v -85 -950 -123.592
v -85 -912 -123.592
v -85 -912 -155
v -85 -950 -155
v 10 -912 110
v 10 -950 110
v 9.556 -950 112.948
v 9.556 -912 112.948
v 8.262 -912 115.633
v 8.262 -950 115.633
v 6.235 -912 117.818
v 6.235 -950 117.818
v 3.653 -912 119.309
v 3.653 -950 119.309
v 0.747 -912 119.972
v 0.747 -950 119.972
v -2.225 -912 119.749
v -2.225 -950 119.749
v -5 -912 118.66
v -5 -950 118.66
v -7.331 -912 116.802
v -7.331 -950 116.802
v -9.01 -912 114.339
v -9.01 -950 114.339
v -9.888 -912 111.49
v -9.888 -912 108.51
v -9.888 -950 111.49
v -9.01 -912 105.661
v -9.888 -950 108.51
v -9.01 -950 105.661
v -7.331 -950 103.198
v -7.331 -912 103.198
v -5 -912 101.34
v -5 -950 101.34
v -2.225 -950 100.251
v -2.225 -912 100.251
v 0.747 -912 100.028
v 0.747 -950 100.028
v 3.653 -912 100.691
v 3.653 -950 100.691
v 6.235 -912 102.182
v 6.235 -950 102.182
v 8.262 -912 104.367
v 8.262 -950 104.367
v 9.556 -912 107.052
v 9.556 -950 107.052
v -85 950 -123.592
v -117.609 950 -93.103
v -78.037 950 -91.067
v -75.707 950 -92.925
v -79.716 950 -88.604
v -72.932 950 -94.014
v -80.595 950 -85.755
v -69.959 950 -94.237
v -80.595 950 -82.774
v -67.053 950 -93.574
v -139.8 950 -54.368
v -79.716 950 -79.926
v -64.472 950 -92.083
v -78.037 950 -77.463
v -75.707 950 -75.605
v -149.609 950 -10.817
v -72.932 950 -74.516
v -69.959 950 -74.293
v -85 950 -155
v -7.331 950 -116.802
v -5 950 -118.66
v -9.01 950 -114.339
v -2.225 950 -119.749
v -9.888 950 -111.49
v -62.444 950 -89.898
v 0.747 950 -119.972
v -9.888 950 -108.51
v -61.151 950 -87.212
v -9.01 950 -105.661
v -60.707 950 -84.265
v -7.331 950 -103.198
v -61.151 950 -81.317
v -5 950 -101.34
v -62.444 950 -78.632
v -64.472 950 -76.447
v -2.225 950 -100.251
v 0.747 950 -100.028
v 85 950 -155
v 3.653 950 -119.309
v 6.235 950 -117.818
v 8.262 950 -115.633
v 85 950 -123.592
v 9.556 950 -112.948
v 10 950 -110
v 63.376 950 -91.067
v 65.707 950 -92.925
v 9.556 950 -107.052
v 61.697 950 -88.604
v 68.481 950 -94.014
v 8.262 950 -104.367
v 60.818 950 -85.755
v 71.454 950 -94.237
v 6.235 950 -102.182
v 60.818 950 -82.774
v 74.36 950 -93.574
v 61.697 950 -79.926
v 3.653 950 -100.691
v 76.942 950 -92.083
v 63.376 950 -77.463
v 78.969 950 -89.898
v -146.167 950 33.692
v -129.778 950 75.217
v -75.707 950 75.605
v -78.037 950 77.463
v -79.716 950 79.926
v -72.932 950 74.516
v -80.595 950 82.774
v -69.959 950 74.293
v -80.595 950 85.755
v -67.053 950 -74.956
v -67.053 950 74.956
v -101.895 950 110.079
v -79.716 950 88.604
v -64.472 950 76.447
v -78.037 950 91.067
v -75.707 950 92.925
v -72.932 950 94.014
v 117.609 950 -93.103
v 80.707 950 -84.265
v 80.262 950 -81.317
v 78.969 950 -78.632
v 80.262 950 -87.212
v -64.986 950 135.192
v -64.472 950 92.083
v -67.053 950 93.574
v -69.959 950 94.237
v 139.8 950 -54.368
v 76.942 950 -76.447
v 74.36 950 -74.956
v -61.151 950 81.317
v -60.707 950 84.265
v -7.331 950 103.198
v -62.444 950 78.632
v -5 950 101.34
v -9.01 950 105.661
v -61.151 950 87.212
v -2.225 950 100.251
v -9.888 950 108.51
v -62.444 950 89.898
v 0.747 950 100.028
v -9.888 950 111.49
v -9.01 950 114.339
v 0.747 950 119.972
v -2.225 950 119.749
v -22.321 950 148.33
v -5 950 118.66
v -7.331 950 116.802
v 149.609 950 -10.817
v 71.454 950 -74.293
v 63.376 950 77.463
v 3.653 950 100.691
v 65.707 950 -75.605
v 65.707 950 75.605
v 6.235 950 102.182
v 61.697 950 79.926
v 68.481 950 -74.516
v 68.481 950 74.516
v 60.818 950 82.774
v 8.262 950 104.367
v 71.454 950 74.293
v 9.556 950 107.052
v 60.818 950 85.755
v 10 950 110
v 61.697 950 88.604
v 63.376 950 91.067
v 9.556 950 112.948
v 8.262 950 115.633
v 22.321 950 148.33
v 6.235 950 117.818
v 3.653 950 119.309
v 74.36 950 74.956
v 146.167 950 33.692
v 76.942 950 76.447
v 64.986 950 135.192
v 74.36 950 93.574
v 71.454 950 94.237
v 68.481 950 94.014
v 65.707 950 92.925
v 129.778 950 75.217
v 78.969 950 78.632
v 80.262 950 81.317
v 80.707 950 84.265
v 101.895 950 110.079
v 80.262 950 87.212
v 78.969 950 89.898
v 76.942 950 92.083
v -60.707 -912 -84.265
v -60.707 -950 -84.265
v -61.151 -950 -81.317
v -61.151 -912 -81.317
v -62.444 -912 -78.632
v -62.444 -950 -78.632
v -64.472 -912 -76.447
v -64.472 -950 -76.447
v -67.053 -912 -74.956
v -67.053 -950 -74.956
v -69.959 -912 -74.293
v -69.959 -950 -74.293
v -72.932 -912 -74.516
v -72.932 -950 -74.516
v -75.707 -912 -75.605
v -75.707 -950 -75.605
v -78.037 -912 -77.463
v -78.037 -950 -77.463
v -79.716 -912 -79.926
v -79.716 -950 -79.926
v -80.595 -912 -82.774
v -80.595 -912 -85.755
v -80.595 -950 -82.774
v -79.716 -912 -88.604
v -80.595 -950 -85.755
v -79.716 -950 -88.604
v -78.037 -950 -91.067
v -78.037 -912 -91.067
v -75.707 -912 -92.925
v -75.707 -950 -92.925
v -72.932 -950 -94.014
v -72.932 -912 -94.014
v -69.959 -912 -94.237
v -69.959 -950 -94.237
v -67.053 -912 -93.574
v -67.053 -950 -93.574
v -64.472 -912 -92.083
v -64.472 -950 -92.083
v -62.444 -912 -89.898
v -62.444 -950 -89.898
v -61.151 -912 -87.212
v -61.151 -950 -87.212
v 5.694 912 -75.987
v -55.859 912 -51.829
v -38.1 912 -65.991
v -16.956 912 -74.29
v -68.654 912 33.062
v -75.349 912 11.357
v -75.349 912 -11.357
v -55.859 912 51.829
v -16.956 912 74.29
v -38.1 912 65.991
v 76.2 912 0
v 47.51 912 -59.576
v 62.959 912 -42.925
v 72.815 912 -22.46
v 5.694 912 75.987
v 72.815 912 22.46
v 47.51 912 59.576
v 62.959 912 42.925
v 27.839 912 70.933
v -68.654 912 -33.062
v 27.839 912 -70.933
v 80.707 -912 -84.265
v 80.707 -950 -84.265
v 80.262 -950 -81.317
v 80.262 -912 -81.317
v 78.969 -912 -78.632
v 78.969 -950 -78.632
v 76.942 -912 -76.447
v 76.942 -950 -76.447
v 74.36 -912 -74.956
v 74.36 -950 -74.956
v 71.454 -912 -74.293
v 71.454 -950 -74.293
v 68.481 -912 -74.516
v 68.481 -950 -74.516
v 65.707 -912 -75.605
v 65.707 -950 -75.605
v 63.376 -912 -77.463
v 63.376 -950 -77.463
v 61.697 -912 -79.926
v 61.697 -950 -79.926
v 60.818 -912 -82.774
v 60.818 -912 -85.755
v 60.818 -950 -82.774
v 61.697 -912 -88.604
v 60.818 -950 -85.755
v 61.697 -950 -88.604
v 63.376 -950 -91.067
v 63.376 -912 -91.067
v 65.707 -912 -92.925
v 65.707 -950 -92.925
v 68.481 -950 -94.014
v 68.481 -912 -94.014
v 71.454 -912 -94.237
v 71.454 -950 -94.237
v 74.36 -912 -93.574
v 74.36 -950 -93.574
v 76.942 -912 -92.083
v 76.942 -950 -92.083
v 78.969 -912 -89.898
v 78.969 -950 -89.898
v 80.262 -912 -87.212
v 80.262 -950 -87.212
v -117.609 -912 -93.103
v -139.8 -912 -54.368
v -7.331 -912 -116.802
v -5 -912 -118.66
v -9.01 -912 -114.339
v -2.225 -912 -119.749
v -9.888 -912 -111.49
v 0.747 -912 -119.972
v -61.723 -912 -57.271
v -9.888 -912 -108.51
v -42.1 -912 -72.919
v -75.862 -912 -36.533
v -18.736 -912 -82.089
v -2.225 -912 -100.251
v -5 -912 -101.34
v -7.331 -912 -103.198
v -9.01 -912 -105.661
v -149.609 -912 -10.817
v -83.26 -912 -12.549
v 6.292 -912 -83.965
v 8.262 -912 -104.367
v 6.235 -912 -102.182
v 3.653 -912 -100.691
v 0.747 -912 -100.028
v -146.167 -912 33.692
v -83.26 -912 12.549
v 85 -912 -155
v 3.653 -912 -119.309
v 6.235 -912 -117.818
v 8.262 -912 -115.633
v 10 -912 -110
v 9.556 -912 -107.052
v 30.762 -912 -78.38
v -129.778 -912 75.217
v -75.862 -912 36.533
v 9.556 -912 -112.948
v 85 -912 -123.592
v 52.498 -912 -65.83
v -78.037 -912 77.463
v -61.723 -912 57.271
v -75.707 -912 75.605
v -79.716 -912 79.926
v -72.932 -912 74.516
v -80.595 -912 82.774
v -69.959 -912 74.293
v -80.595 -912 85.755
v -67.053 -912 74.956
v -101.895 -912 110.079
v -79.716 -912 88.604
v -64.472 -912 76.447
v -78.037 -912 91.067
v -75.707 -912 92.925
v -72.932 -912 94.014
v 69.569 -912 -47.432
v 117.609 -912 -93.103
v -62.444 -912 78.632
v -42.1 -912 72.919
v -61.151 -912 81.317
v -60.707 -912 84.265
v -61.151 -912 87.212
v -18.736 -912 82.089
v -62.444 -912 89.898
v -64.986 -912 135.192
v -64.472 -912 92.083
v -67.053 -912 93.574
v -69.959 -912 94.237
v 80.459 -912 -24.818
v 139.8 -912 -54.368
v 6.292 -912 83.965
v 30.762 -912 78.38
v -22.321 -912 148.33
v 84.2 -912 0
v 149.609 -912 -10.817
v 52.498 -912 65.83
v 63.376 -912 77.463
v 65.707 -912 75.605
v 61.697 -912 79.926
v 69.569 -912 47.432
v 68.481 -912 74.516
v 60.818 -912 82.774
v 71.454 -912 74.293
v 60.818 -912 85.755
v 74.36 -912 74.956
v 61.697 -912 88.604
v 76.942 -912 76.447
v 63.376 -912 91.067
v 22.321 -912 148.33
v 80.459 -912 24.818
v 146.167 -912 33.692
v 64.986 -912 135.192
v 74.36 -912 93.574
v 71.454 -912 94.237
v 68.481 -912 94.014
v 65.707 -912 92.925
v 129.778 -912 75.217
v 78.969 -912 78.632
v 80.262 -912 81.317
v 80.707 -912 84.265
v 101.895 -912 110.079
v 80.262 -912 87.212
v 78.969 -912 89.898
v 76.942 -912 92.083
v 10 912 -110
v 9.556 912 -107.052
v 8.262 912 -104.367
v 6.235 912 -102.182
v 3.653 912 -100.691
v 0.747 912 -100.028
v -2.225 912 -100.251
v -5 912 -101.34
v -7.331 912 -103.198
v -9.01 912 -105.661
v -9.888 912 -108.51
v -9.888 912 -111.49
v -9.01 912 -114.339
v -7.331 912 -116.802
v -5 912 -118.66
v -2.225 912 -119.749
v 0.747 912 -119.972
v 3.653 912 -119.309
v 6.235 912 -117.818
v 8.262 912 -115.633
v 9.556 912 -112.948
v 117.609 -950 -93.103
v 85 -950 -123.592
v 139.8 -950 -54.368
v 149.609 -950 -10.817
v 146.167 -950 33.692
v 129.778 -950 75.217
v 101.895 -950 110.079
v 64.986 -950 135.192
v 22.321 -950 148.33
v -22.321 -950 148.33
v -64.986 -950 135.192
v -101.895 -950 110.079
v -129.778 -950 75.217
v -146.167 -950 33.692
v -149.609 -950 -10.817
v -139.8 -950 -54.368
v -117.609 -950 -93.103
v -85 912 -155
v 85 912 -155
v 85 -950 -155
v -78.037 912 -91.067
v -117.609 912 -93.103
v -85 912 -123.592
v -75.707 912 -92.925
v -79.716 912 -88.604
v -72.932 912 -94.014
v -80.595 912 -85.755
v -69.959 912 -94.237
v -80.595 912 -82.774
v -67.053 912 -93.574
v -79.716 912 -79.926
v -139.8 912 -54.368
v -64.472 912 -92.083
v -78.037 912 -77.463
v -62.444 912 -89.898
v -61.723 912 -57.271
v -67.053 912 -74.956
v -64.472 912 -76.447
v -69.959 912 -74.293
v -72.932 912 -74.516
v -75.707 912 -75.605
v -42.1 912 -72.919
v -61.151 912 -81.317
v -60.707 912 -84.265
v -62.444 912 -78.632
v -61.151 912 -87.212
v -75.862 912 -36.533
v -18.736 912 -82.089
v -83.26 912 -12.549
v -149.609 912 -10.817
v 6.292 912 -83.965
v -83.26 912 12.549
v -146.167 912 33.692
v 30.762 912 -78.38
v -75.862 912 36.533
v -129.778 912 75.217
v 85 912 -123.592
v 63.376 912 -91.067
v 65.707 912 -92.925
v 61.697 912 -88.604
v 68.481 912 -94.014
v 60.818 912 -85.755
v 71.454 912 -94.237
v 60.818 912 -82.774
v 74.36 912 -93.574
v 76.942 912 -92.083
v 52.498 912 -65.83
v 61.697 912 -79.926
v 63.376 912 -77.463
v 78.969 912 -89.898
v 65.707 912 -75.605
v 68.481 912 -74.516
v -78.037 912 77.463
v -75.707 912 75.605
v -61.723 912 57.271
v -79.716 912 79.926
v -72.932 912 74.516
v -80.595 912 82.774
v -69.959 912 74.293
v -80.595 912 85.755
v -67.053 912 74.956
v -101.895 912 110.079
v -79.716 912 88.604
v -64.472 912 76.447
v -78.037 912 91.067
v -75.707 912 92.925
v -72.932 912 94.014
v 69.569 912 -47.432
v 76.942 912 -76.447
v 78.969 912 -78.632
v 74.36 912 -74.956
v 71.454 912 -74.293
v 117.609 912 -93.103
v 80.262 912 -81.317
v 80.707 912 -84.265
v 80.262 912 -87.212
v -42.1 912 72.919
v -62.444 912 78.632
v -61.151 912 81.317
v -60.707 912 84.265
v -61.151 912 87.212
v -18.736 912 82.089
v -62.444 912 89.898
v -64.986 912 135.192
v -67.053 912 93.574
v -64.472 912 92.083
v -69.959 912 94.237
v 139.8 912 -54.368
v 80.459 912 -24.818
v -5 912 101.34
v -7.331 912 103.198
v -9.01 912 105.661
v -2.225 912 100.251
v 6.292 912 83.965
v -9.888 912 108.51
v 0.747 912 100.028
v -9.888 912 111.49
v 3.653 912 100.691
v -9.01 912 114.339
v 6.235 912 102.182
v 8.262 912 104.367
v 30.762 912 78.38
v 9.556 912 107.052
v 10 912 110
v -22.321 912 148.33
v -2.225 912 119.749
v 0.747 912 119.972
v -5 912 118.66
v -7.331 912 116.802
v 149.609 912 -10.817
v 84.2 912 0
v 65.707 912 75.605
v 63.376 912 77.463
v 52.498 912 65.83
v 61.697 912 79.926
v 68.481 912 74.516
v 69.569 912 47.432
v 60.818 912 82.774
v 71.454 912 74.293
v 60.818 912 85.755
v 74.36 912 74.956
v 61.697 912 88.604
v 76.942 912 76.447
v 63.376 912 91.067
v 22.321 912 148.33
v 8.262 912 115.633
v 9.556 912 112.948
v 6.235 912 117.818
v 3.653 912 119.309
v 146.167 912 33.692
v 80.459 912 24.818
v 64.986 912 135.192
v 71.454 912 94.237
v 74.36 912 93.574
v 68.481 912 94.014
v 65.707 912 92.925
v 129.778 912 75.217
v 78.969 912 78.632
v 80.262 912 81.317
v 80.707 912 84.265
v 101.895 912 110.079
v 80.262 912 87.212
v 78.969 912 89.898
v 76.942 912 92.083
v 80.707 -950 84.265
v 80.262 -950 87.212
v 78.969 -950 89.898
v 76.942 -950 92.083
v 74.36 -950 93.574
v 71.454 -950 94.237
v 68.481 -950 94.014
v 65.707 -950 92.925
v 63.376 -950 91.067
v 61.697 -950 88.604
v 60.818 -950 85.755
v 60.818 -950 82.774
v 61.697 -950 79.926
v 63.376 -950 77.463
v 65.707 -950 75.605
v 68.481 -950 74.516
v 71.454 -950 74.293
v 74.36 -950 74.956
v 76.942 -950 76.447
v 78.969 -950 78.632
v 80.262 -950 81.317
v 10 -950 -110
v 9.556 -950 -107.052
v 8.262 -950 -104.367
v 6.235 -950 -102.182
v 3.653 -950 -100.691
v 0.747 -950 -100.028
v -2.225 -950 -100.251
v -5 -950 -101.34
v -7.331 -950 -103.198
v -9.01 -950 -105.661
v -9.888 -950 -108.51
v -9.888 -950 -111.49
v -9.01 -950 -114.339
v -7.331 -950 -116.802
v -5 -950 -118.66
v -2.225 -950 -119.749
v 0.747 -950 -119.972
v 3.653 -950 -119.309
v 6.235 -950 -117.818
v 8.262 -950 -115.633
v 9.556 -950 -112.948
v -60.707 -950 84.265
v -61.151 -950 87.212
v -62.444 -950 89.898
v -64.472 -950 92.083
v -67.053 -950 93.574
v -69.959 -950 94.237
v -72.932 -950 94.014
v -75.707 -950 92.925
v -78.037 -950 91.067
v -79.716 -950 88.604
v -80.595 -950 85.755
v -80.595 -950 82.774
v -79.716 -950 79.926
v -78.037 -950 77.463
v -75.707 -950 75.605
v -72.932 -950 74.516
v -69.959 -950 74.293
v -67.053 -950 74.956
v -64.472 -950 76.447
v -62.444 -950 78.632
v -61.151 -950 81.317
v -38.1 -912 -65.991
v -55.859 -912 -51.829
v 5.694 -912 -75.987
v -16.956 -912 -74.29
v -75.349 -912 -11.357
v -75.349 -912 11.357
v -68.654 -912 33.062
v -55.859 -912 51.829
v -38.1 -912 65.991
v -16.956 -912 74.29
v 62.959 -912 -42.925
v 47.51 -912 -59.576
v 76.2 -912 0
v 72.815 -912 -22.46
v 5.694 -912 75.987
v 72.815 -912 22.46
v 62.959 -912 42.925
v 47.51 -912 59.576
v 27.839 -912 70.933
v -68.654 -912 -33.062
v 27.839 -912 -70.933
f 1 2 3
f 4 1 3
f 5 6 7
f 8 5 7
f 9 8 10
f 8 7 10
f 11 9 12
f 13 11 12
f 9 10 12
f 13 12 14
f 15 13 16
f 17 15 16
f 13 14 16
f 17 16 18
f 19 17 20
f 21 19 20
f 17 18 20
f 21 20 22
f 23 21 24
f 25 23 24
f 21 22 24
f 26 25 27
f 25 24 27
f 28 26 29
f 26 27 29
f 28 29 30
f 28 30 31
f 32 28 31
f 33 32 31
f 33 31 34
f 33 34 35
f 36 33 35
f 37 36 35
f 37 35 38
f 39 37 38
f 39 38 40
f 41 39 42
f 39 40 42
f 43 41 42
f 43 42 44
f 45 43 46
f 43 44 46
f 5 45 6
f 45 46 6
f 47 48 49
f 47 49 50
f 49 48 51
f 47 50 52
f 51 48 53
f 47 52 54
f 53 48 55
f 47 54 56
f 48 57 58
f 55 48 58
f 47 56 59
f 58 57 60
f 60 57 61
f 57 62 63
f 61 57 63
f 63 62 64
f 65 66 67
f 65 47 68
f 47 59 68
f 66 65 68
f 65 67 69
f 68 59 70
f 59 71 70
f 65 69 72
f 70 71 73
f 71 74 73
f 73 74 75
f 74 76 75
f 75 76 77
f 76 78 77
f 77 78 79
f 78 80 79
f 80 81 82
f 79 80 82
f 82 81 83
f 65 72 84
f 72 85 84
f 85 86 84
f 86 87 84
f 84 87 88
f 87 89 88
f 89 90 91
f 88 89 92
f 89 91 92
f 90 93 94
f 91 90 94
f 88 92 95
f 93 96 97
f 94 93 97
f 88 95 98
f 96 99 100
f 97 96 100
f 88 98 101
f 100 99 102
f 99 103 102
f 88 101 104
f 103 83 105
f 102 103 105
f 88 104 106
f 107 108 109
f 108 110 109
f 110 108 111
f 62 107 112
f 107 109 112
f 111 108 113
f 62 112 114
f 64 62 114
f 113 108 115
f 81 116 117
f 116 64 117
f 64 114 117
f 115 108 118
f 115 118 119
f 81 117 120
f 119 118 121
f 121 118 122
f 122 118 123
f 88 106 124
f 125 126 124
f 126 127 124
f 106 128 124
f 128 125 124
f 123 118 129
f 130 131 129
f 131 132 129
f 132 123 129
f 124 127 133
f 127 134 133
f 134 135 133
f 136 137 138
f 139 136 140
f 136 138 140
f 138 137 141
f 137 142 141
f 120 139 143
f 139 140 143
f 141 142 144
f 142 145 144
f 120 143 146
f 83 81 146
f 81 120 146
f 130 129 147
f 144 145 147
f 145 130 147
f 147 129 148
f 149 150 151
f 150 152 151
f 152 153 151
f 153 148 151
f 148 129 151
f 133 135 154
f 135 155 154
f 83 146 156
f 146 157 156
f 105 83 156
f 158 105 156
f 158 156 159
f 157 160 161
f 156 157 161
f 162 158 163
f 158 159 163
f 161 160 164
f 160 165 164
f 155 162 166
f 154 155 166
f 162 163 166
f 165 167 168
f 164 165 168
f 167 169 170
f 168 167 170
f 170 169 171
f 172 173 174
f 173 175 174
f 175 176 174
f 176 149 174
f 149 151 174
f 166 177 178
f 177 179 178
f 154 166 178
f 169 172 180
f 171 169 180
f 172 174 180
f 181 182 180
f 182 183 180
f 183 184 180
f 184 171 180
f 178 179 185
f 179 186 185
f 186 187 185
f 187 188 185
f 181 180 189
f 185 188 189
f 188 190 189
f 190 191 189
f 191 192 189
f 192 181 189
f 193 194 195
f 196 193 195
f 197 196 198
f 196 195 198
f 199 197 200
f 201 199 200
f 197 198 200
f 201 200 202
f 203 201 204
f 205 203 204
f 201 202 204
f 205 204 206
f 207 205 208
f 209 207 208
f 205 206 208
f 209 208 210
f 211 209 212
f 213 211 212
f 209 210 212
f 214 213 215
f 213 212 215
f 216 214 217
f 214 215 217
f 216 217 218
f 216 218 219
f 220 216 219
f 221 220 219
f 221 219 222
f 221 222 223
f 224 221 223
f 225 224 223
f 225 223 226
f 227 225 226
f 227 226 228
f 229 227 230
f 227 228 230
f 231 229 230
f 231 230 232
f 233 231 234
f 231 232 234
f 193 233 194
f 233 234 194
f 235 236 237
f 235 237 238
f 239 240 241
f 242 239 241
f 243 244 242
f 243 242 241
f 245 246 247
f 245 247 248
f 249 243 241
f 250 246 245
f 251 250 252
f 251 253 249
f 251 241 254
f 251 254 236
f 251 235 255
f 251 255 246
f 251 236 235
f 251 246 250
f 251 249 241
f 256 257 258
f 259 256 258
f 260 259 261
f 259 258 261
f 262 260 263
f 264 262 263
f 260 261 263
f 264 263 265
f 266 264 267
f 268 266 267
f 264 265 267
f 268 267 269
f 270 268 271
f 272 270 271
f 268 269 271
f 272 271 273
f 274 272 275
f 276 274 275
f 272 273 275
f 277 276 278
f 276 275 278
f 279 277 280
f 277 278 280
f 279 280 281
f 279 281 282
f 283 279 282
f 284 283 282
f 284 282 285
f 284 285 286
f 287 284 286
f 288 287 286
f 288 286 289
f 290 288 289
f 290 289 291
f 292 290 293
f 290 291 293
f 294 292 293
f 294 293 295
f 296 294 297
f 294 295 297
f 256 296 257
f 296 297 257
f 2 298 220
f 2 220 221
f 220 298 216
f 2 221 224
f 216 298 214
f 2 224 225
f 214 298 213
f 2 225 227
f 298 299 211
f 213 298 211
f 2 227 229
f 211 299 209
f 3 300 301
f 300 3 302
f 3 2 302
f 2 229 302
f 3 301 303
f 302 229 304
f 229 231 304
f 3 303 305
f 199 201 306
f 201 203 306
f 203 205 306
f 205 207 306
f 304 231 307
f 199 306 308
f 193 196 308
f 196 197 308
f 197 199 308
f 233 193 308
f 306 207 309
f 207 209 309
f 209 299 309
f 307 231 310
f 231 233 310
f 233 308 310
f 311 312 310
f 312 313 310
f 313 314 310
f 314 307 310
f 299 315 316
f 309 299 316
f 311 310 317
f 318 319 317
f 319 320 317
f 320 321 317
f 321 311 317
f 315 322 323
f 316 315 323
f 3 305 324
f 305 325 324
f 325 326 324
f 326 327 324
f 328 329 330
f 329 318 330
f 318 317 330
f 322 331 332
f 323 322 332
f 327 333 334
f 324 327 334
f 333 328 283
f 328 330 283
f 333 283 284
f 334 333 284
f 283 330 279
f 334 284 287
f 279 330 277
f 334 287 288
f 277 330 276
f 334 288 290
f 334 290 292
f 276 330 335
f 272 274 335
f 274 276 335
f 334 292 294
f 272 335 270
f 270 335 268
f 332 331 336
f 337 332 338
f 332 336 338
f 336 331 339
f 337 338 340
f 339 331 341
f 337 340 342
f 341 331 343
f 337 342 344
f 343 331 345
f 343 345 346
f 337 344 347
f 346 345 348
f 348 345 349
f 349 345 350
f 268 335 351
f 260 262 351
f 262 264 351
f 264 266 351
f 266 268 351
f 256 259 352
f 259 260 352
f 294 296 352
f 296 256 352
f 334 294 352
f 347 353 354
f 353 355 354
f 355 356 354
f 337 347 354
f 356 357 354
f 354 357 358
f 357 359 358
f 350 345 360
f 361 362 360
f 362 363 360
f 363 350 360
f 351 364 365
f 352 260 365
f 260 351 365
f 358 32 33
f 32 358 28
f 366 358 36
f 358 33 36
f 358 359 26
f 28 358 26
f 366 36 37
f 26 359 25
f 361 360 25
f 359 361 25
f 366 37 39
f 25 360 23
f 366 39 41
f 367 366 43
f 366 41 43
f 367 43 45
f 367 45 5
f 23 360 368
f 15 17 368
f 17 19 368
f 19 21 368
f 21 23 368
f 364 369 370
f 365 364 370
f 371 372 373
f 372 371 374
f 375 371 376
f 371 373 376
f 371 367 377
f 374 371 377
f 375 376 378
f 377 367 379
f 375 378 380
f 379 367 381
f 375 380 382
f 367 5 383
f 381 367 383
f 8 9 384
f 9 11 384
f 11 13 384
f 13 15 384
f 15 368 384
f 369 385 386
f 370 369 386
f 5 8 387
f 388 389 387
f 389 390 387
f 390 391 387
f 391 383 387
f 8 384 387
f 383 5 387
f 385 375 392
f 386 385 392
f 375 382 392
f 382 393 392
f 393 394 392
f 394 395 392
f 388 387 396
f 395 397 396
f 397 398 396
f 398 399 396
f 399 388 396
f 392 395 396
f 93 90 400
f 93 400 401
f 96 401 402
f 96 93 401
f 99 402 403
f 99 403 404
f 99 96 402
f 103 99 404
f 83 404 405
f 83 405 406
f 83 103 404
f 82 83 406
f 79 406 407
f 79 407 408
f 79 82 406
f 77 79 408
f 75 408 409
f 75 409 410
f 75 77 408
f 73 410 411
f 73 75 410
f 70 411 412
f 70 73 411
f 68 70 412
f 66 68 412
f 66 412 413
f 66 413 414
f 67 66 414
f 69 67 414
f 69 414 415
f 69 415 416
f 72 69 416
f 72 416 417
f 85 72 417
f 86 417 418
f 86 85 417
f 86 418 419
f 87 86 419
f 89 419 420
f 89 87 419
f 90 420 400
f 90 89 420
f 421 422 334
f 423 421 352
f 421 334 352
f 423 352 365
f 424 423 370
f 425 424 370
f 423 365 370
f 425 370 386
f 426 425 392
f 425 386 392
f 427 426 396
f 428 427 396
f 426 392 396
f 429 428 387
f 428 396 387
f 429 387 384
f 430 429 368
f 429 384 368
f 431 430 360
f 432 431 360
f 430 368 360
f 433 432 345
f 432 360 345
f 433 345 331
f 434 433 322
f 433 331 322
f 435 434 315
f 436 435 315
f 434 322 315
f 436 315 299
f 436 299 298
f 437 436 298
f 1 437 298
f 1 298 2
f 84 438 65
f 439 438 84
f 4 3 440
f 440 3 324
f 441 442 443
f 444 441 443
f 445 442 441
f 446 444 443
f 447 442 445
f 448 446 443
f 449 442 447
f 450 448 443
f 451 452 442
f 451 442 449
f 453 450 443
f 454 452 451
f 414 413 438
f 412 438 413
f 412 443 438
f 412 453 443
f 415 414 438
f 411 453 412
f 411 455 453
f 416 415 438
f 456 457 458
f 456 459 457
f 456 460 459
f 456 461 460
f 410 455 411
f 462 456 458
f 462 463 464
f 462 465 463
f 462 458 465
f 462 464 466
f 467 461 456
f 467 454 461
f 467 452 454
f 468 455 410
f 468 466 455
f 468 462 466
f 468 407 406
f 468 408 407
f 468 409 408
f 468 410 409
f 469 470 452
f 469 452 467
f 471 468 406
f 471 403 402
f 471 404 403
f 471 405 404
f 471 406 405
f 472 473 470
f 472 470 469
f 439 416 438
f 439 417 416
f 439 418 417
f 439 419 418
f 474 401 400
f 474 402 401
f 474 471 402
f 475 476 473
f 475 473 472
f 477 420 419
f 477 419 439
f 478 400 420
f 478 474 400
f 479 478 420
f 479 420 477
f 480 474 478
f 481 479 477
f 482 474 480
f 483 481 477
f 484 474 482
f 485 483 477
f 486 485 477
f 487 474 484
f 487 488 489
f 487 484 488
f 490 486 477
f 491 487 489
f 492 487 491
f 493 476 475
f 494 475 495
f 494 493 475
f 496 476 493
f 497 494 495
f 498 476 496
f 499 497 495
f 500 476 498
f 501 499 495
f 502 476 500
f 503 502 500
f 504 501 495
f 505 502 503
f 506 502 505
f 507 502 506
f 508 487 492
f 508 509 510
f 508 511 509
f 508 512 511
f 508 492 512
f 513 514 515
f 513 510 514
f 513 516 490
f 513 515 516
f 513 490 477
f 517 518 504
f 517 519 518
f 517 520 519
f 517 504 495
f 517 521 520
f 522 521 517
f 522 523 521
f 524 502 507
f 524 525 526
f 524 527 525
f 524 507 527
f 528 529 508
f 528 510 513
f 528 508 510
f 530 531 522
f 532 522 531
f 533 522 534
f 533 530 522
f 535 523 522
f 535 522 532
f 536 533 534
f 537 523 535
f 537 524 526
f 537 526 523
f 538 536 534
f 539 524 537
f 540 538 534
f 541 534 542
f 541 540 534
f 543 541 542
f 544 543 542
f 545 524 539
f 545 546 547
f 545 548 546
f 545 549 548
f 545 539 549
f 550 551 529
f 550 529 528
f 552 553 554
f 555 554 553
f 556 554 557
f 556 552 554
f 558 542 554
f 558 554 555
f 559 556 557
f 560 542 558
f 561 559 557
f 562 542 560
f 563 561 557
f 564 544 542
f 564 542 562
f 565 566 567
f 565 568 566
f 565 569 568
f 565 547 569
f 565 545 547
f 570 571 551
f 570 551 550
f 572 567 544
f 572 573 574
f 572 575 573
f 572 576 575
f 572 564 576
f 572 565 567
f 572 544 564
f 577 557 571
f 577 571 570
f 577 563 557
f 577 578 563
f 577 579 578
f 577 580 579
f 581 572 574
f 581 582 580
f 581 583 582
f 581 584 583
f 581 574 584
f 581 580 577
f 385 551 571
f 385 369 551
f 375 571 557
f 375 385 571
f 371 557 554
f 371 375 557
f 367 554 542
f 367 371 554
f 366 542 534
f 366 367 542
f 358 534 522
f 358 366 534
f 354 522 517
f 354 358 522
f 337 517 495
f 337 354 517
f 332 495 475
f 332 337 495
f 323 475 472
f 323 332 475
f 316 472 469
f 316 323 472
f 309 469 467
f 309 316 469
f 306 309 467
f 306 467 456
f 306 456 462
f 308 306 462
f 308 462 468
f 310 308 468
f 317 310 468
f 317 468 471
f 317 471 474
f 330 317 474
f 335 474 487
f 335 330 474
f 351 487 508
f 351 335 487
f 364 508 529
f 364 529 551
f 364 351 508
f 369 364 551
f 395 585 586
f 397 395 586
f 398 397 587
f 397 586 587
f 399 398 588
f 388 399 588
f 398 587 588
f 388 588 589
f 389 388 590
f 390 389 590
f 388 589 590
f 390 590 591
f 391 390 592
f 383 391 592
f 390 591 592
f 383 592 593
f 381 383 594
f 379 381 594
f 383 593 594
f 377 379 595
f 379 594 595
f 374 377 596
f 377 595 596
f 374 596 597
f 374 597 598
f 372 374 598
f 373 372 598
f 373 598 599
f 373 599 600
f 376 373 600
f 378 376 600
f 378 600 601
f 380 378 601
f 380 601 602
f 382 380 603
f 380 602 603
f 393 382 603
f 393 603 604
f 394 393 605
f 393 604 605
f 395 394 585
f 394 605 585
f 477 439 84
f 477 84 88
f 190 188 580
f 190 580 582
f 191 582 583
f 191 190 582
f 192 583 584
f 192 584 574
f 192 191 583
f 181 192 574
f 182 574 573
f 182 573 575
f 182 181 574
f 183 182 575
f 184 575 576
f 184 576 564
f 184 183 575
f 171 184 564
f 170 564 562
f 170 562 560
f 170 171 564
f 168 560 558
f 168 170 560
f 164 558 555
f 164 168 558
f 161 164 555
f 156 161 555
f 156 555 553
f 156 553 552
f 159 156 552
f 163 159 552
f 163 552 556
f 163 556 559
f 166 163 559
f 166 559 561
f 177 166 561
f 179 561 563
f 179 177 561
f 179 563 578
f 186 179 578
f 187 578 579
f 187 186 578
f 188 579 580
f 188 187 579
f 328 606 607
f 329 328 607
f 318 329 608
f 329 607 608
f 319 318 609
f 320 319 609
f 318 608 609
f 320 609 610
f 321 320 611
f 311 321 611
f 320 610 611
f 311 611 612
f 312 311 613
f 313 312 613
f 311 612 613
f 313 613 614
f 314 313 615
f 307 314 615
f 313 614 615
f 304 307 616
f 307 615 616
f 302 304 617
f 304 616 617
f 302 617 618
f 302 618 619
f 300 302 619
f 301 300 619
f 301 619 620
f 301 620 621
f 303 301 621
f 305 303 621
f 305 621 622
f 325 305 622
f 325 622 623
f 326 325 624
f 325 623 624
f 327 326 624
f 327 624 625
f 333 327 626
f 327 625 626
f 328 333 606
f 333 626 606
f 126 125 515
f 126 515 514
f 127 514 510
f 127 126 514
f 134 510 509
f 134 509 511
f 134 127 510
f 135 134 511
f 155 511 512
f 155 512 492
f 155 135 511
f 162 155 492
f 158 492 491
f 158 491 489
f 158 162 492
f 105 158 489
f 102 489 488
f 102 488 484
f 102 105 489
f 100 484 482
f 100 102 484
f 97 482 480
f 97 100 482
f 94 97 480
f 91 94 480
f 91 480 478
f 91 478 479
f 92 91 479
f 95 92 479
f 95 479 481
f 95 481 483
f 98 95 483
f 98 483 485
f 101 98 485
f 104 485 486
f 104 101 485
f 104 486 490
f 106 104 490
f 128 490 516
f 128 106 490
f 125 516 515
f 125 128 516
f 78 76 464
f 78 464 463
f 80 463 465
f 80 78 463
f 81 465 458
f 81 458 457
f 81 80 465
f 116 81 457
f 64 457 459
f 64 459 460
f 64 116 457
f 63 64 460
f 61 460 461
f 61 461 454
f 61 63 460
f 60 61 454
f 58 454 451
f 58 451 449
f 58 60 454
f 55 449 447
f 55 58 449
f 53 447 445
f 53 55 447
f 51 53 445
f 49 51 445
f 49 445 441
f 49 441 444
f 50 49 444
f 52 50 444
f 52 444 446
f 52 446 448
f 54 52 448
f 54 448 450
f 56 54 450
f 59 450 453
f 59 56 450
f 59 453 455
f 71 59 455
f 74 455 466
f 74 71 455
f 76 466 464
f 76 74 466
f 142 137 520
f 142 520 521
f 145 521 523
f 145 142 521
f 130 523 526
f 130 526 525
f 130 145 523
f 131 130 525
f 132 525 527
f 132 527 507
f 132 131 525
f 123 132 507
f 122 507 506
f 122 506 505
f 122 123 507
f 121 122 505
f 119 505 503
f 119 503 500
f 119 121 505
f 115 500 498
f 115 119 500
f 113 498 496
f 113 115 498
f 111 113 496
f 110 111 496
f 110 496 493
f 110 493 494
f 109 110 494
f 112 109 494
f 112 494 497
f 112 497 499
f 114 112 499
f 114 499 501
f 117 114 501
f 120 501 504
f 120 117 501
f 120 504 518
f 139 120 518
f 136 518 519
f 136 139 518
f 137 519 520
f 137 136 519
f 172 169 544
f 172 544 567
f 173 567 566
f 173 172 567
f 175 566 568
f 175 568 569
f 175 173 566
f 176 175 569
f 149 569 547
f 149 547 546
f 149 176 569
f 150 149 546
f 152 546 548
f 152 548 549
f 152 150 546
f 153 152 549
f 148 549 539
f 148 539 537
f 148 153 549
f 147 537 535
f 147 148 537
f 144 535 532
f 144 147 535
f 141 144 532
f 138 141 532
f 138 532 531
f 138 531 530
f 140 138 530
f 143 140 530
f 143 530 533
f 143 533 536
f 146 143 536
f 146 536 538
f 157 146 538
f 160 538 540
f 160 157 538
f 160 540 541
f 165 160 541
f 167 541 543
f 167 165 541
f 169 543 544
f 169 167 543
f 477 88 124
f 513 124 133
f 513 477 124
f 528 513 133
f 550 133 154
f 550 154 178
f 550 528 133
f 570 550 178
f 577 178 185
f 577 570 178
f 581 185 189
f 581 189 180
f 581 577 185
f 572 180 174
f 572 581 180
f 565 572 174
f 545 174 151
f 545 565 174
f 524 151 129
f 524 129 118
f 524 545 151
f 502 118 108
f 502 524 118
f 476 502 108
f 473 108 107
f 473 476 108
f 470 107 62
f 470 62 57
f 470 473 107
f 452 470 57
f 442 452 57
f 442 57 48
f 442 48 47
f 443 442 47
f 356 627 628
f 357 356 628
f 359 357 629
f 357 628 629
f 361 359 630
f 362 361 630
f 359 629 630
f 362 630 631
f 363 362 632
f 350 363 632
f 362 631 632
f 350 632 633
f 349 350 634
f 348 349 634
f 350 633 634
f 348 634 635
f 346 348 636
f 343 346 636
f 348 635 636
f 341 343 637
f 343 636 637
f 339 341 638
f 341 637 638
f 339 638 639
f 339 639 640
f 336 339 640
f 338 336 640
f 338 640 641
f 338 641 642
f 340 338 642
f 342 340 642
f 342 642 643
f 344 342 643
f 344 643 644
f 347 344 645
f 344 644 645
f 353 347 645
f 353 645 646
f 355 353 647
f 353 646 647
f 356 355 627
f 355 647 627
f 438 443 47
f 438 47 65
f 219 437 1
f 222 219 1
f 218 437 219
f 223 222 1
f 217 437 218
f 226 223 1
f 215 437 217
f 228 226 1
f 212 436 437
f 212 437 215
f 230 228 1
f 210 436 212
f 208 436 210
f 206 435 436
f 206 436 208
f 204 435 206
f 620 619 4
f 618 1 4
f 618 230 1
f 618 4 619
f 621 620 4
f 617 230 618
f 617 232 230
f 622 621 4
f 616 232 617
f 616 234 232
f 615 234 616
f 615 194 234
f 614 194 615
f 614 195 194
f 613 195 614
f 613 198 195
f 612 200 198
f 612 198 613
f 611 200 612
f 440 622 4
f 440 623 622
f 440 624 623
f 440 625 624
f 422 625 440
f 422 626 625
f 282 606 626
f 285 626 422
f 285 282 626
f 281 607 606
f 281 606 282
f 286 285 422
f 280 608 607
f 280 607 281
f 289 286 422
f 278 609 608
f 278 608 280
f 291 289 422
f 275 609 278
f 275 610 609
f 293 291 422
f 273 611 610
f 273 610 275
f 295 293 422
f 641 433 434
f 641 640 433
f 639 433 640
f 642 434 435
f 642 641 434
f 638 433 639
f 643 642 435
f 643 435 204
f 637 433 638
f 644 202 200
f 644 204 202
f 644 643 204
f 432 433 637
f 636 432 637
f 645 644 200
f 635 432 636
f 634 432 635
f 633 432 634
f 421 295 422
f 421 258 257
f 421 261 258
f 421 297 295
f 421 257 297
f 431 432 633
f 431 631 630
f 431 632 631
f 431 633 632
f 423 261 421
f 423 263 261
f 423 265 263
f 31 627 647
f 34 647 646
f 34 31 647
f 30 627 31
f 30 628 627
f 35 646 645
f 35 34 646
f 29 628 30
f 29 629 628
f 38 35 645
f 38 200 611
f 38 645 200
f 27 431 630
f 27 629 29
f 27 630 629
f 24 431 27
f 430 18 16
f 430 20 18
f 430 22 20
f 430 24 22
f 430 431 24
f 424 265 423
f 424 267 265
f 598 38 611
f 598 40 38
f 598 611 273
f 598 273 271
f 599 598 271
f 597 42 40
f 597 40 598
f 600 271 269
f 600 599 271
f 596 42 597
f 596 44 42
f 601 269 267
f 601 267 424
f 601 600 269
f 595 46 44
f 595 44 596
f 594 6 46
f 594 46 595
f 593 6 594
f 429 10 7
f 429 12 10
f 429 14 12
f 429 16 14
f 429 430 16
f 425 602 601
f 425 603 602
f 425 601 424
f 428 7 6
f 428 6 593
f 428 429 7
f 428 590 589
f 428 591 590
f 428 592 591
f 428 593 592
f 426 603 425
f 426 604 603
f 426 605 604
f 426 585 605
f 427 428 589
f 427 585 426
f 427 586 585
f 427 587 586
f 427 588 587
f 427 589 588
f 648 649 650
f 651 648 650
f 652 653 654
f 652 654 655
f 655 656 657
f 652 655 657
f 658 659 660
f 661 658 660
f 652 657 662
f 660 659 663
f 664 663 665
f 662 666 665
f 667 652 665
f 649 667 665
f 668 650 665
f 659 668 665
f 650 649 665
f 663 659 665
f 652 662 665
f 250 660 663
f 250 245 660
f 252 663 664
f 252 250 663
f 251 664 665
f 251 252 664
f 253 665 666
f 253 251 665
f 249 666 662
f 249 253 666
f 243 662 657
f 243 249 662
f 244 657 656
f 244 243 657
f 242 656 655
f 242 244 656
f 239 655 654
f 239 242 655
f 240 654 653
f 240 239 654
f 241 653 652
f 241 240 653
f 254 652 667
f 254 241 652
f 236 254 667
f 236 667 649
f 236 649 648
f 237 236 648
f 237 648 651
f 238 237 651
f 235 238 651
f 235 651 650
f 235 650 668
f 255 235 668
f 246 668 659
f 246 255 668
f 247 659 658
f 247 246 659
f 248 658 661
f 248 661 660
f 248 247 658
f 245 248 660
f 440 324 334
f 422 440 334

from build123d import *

# Parameters (mm, degrees)
F0_R      = 84.2
F0_R_2    = 76.2
F1_DEPTH  = 912
F2_R      = 75
F3_DEPTH  = 10
F4_R      = 10
F5_DEPTH  = 10
F8_DEPTH  = 38
F9_R      = 10
F10_DEPTH = 38


# Not quite as in the source:
# - a pattern or mirror of a feature is missing from the dataset's text; its kind, count and spacing are read off the source's solid
# - a feature names something its author has since deleted; it is built from what else it names


with BuildPart() as f1:
    # F0 (on Front) → F1 (new body, symmetric)
    with BuildSketch(Plane.XZ):
        Circle(F0_R)
        Circle(F0_R_2, mode=Mode.SUBTRACT)
    extrude(amount=F1_DEPTH, both=True)

    # F7 (on face) → F8 (join)
    with BuildSketch(Plane.XZ.offset(912)):
        with BuildLine():
            Line((85, -155), (85, -123.5920709431))
            ThreePointArc((85, -123.5920709431), (0, 150), (-85, -123.5920709431))
            Line((-85, -123.5920709431), (-85, -155))
            Line((-85, -155), (85, -155))
        make_face()
    f8 = extrude(amount=F8_DEPTH)

    # F8_copies: F8 across plane
    add(f8.mirror(Plane.ZX))

    # F9 (on face) → F10 (cut, through all)
    with BuildSketch(Plane.XZ.offset(950)):
        with Locations((-70.7066370655, 84.2648887431)):
            Circle(F9_R)
        with Locations((0, 110)):
            Circle(F9_R)
        with Locations((70.7066370655, 84.2648887431)):
            Circle(F9_R)
        with Locations((-70.7066370655, -84.2648887431)):
            Circle(F9_R)
        with Locations((0, -110)):
            Circle(F9_R)
        with Locations((70.7066370655, -84.2648887431)):
            Circle(F9_R)
    f10 = extrude(amount=-F10_DEPTH, mode=Mode.SUBTRACT)

    # F10_copies: F10 across plane
    add(f10.mirror(Plane.ZX), mode=Mode.SUBTRACT)


with BuildPart() as f3:
    # F2 (on face) → F3 (new body)
    with BuildSketch(Plane.XZ.offset(912)):
        Circle(F2_R)
    extrude(amount=F3_DEPTH)

    # F4 (on face) → F5 (cut, through all)
    with BuildSketch(Plane.XZ.offset(922)):
        with Locations((0, 61)):
            Circle(F4_R)
        with Locations((-52.8275496309, 30.5)):
            Circle(F4_R)
        with Locations((-52.8275496309, -30.5)):
            Circle(F4_R)
        with Locations((0, -61)):
            Circle(F4_R)
        with Locations((52.8275496309, -30.5)):
            Circle(F4_R)
        with Locations((52.8275496309, 30.5)):
            Circle(F4_R)
    extrude(amount=-F5_DEPTH, mode=Mode.SUBTRACT)


solid = f1.part
